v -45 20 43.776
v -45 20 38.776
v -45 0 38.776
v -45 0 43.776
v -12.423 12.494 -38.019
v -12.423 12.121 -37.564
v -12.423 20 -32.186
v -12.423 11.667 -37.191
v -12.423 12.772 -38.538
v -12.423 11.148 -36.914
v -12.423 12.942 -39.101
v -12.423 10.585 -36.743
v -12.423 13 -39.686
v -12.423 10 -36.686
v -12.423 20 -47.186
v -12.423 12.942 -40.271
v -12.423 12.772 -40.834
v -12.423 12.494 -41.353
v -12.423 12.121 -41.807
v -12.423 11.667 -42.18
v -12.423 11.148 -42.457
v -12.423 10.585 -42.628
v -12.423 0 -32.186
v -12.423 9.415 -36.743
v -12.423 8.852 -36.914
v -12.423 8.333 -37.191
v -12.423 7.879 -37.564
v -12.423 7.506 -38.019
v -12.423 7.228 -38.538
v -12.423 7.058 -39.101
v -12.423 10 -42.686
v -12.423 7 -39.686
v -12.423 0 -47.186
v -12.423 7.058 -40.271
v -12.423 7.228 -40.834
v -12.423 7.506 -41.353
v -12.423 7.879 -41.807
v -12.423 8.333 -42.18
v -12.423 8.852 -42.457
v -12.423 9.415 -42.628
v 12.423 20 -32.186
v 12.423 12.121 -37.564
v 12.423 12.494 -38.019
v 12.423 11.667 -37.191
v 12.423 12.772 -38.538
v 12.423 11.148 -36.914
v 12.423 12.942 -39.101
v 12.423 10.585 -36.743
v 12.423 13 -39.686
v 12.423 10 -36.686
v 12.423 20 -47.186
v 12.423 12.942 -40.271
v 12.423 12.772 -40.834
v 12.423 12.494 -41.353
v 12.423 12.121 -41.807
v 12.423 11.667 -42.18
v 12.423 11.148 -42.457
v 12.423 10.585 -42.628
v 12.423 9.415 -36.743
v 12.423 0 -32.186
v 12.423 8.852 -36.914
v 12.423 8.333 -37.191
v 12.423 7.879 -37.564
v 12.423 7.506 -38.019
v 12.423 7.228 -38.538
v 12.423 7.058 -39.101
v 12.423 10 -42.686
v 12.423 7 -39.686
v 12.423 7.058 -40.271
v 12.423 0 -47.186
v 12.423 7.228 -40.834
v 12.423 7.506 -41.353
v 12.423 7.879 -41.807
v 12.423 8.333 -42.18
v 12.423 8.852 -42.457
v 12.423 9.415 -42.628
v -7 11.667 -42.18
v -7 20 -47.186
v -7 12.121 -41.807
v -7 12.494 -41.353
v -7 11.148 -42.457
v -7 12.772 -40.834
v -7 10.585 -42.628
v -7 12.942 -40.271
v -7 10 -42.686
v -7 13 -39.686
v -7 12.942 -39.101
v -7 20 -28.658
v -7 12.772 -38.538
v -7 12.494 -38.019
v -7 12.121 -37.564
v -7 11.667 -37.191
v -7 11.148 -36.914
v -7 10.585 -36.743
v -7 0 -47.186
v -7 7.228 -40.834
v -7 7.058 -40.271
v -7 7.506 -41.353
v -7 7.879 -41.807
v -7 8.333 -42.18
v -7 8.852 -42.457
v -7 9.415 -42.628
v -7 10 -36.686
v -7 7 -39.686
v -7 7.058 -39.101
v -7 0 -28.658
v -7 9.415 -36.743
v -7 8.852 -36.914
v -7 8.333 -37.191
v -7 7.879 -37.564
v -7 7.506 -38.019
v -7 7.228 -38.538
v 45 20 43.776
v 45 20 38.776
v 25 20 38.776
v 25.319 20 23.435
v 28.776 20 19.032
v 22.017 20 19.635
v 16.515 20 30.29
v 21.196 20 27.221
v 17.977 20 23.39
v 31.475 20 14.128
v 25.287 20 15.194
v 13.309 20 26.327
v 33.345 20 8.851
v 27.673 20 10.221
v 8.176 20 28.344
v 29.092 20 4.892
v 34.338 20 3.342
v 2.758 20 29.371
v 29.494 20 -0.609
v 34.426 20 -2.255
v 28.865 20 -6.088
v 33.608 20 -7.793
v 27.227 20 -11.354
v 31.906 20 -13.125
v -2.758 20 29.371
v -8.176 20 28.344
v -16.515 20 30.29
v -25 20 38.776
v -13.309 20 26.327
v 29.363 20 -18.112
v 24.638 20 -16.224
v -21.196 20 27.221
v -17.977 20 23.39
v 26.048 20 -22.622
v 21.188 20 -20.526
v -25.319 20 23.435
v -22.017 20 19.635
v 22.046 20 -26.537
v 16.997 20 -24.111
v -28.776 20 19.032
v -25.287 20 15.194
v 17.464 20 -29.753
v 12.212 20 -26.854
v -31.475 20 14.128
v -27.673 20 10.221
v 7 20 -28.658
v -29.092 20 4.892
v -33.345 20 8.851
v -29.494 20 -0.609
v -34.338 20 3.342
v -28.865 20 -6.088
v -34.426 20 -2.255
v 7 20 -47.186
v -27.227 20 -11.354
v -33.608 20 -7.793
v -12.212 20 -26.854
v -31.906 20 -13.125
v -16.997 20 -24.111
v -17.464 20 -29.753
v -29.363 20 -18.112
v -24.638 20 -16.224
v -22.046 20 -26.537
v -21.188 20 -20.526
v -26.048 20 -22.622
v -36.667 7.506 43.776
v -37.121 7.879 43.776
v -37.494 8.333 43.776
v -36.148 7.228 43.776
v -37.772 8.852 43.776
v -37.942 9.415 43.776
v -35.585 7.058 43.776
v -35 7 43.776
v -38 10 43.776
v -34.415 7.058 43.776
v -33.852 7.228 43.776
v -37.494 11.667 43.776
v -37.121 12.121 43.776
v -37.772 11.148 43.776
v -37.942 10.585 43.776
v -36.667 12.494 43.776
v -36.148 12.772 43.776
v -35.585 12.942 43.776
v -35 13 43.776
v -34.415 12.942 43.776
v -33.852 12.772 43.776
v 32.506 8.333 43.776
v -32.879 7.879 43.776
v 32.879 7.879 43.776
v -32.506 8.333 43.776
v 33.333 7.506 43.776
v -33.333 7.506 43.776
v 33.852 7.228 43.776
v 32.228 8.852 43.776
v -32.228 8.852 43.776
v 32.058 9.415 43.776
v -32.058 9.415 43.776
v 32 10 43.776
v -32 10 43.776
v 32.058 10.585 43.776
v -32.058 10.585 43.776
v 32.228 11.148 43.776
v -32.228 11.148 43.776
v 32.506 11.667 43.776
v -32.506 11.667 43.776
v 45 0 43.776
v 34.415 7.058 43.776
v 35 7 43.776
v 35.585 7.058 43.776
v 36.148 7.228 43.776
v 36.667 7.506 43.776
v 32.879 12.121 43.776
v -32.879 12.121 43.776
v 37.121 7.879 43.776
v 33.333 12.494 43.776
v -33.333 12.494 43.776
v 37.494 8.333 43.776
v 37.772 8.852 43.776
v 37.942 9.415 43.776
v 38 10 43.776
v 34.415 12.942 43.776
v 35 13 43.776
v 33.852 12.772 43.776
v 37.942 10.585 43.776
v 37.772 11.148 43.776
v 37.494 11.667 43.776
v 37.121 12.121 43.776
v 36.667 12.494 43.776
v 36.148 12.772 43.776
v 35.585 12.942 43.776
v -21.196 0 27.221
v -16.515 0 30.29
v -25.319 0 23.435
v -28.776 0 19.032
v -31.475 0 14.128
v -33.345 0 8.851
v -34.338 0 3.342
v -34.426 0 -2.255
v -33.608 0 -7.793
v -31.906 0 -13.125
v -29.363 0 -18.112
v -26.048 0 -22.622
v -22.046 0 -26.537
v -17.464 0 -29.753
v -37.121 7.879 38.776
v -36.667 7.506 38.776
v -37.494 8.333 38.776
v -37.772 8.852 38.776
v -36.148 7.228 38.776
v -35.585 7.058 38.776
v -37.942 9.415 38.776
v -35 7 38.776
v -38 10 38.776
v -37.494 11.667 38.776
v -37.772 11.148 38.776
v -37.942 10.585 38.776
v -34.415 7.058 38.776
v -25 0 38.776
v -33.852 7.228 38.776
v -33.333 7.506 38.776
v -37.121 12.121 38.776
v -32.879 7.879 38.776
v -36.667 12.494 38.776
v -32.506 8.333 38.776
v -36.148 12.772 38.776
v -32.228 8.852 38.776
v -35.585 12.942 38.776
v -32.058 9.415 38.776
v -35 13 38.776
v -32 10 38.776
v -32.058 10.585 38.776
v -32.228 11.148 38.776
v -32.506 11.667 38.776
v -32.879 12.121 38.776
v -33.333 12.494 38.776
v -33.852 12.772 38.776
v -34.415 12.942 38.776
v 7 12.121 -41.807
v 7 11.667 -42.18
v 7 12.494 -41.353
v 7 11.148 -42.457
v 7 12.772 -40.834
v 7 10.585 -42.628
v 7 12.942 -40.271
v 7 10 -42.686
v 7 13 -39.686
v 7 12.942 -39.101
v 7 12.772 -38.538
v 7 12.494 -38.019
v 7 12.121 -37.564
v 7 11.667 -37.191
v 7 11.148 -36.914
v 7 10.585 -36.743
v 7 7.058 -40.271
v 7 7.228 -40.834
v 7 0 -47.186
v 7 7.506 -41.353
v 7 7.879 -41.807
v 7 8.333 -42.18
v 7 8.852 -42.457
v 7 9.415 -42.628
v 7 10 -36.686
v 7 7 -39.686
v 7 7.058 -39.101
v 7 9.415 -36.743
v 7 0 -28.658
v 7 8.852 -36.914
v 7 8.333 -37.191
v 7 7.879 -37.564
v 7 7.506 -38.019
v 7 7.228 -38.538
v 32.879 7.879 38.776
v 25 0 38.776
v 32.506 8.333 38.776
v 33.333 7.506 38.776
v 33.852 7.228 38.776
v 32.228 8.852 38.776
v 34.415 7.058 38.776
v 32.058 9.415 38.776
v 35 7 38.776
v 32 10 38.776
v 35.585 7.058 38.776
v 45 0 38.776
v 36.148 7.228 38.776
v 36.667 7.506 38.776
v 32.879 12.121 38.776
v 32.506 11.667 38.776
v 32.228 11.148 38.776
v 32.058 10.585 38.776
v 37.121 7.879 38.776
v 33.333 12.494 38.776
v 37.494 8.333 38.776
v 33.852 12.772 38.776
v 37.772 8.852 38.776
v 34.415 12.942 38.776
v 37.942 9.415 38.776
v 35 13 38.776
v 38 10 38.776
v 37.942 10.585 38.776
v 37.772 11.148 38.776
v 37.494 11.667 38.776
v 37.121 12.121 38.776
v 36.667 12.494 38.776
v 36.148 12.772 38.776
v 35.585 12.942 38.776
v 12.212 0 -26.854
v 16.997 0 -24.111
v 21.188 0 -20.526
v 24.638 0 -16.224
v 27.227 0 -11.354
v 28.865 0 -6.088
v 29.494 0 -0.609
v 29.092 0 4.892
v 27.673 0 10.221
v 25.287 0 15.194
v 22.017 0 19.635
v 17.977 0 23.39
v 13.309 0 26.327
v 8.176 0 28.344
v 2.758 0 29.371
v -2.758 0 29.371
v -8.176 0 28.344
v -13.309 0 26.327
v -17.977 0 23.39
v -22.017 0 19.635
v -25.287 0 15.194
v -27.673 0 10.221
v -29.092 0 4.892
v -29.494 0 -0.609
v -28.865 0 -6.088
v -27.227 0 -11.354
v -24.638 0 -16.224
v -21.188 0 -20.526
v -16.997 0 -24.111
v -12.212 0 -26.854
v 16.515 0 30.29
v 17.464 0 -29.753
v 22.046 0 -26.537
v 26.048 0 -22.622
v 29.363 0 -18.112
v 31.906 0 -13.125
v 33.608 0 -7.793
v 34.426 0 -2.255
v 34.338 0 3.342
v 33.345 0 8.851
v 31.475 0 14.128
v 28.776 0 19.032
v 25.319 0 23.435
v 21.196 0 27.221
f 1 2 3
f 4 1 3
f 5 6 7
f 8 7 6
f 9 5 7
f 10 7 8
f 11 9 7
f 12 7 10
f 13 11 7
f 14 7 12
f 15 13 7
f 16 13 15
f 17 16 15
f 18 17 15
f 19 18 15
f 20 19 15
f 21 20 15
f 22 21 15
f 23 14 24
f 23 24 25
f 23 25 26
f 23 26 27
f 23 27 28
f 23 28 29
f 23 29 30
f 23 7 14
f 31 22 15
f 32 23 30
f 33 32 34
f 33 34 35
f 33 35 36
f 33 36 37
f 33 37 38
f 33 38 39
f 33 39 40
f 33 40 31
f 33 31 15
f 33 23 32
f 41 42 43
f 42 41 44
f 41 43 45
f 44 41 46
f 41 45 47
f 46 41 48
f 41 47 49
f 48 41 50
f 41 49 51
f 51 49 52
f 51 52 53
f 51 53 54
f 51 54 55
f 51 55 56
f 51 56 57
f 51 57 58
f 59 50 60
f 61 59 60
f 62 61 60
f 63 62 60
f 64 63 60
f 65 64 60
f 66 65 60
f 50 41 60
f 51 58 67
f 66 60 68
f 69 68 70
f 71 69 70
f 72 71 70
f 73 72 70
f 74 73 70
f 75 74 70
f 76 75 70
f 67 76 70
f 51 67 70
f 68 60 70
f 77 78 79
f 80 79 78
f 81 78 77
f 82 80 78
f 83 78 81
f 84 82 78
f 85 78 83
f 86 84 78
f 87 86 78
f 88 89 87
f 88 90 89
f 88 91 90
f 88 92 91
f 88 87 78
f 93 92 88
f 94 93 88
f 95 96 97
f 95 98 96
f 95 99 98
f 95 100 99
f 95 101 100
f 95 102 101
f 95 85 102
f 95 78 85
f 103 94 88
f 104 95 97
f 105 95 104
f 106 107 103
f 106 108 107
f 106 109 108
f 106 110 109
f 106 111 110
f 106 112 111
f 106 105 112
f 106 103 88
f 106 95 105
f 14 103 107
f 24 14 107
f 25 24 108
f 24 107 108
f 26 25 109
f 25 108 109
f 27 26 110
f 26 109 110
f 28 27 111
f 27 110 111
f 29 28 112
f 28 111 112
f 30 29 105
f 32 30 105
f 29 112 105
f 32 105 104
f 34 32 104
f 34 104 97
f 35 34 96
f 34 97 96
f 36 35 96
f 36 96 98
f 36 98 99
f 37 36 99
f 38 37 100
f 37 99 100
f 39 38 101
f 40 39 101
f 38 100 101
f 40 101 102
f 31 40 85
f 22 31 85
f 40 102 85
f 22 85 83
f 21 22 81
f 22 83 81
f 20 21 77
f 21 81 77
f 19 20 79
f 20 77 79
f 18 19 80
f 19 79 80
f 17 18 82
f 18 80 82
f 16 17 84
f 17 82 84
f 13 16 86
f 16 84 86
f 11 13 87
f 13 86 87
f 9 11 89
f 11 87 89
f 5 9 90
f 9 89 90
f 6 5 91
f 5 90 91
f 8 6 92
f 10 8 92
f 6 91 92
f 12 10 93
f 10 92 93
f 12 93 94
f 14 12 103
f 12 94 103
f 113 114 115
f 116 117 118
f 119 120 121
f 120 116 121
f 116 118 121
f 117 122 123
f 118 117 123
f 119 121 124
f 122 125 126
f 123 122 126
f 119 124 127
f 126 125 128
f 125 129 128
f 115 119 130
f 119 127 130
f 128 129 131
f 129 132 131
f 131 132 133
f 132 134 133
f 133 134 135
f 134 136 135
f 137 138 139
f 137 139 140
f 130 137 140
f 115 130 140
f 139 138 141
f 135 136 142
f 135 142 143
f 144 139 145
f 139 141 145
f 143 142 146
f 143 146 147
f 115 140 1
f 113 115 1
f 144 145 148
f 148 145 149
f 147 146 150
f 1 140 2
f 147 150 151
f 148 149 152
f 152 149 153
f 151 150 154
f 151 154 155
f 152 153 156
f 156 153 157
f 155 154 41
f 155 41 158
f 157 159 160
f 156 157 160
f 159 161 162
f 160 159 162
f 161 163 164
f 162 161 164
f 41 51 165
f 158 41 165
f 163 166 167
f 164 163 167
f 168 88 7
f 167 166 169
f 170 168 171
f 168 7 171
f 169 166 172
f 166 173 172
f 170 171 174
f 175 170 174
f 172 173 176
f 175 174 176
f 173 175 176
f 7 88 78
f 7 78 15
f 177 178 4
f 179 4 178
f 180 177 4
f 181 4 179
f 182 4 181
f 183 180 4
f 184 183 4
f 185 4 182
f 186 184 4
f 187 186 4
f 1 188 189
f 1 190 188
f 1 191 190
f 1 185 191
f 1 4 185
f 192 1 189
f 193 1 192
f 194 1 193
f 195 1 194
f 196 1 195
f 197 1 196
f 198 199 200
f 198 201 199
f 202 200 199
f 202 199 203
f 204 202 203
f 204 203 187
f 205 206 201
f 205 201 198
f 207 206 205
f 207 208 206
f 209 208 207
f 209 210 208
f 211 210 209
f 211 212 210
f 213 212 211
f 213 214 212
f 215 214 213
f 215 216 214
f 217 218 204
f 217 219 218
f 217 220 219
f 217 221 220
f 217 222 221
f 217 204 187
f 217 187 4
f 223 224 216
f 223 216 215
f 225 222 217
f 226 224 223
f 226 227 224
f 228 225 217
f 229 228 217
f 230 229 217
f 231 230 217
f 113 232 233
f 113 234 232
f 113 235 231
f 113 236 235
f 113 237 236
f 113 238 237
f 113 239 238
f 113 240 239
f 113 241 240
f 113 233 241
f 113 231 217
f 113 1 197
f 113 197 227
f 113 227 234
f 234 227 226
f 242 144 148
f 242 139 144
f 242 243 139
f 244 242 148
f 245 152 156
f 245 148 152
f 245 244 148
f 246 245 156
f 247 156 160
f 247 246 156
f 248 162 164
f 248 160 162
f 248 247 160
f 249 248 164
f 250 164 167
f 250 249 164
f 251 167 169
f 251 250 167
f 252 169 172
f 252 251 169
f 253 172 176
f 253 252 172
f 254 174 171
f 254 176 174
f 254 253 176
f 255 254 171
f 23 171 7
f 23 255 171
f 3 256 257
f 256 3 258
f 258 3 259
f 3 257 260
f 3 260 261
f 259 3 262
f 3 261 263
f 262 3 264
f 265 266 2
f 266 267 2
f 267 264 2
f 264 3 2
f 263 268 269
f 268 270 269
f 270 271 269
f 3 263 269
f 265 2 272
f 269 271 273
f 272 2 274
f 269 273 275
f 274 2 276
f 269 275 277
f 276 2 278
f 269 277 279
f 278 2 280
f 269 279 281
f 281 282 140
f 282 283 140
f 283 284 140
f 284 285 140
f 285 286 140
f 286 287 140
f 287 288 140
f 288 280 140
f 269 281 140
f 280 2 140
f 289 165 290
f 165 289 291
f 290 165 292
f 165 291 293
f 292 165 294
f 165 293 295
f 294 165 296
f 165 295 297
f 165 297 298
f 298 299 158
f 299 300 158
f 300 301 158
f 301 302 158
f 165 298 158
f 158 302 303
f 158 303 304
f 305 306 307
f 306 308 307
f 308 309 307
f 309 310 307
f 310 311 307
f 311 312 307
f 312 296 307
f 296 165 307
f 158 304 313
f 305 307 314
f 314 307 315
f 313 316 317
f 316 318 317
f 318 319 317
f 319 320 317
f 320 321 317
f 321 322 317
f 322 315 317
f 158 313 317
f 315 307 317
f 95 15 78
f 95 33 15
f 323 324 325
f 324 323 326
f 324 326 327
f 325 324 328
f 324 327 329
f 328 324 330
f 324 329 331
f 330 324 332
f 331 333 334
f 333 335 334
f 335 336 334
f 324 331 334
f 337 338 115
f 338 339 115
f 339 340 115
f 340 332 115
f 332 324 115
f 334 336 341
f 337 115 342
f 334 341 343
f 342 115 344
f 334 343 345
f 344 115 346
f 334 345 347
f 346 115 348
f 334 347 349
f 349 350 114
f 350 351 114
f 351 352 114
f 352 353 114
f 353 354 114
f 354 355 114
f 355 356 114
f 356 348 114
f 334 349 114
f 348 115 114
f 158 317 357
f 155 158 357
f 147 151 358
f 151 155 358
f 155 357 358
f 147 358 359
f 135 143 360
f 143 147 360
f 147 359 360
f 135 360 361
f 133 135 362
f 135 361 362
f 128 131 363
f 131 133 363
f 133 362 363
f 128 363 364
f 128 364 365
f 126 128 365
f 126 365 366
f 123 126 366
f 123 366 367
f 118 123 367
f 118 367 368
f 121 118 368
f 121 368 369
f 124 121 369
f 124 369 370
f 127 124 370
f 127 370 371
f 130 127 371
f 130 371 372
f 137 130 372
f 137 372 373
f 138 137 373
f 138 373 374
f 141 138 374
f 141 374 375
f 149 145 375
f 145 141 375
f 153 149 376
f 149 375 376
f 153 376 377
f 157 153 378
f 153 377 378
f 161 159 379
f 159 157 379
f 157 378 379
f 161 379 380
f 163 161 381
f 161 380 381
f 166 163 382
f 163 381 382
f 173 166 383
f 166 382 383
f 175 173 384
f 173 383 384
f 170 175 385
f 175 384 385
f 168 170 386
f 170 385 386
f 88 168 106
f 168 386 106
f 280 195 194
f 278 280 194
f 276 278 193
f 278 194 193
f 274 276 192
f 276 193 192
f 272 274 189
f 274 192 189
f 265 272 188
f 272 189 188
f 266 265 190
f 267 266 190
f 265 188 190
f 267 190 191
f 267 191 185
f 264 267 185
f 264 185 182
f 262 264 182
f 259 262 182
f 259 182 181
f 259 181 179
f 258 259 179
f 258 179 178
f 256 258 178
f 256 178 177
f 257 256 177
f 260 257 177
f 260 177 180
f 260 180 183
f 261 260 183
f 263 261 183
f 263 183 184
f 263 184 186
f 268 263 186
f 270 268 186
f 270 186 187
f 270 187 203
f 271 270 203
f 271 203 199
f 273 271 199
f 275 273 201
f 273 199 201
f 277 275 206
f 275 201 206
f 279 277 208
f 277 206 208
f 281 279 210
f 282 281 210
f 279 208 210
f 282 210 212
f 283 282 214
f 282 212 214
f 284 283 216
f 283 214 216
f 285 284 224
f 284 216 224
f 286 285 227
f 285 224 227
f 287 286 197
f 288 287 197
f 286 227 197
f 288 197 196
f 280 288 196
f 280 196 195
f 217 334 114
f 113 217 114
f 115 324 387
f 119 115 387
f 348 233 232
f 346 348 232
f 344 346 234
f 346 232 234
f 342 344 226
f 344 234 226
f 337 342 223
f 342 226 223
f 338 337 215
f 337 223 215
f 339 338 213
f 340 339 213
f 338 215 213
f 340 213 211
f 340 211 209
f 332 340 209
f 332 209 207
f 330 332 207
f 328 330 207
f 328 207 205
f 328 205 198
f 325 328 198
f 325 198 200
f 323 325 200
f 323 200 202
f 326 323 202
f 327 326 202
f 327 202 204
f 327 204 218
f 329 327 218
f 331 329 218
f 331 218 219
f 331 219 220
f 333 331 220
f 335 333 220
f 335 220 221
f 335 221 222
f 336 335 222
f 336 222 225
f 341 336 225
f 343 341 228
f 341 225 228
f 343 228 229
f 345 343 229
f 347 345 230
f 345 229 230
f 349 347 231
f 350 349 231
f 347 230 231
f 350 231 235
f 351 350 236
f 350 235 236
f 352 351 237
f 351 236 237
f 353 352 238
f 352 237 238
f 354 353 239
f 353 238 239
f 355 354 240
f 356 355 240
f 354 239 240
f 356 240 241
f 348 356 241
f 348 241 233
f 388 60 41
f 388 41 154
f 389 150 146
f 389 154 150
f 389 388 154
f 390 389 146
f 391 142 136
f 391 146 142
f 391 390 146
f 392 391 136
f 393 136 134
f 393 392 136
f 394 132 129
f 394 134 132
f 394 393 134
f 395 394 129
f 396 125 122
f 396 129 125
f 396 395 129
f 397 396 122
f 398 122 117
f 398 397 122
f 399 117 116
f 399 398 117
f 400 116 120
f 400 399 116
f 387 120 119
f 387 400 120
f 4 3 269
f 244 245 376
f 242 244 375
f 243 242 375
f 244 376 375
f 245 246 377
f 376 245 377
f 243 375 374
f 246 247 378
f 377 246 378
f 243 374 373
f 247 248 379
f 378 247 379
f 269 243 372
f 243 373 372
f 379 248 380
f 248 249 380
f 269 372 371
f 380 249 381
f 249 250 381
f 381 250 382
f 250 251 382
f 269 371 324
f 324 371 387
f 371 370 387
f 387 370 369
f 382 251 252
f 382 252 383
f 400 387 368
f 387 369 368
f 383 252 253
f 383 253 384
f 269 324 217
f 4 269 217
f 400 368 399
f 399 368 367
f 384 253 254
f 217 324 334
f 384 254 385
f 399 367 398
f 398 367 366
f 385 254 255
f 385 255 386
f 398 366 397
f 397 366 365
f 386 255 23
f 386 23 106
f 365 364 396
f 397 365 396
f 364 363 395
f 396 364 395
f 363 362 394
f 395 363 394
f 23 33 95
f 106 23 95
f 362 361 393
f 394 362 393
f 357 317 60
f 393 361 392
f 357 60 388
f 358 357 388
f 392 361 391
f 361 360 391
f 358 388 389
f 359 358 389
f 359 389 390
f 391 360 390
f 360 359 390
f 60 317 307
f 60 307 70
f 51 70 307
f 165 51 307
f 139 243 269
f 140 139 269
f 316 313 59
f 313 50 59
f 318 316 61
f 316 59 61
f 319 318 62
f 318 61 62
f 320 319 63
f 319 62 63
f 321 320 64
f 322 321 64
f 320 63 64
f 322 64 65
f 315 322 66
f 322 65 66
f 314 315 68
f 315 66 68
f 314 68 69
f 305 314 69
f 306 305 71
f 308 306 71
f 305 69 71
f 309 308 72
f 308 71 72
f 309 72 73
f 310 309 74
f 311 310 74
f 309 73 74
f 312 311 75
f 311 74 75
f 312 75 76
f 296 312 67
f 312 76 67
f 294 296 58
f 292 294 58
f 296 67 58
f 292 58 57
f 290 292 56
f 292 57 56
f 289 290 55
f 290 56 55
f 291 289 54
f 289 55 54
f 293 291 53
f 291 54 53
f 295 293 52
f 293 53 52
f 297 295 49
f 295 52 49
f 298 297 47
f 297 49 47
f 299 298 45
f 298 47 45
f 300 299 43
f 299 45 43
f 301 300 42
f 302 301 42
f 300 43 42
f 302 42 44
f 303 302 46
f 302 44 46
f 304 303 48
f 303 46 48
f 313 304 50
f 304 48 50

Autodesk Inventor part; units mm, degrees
ref_plane "YZ Plane" through (0, 0, 0) normal (1, 0, 0) x (0, 1, 0)
ref_plane "XZ Plane" through (0, 0, 0) normal (0, 1, 0) x (-1, 0, 0)
ref_plane "XY Plane" through (0, 0, 0) normal (0, 0, 1) x (1, 0, 0)
sketch "Sketch1" plane through (0, 0, 0) normal (0, 1, 0) x (-1, 0, 0)
  arc A0 (7, -28.6575) -> (-7, -28.6575) centre (0, 0) ccw
  arc A1 (12.4228, -32.1858) -> (-12.4228, -32.1858) centre (0, 0) ccw
  line L0 (16.5147, 30.2905) -> (25, 38.7758)
  line L1 (16.5147, 30.2905) -> (28.5147, 30.2905) construction
  line L2 (25, 38.7758) -> (-25, 38.7758)
  line L3 (-25, 38.7758) -> (-16.5147, 30.2905)
  line L4 (12.4228, -32.1858) -> (12.4228, -47.1858)
  line L5 (12.4228, -47.1858) -> (7, -47.1858)
  line L6 (7, -47.1858) -> (7, -28.6575)
  line L7 (0, 0) -> (0, -37.5587) construction
  line L8 (-12.4228, -32.1858) -> (-12.4228, -47.1858)
  line L9 (-12.4228, -47.1858) -> (-7, -47.1858)
  line L10 (-7, -47.1858) -> (-7, -28.6575)
  dimension "d0" = 59
  dimension "d5" = 12
  dimension "d6" = 45
  dimension "d7" = 5
  dimension "d15" = 15
  dimension "d46" = 50
  dimension "d47" = 45
  dimension "d48" = 5.4228
  dimension "d49" = 14
  dimension "d50" = 12
extrude "Extrusion3" add sketch "Sketch1" along normal blind 20
sketch "Sketch3" plane through (-25, 0, 38.7758) normal (0, 0, 1) x (1, 0, 0)
  line L0 (0, 0) -> (50, 0) projected
  line L1 (0, 20) -> (50, 20) projected
  line L2 (-20, 0) -> (70, 0)
  line L3 (70, 0) -> (70, 20)
  line L4 (70, 20) -> (-20, 20)
  line L5 (-20, 20) -> (-20, 0)
  point P0 (25, 0)
  point P1 (25, 20)
  dimension "d18" = 90
  dimension "d19" = 20
extrude "Extrusion4" add sketch "Sketch3" along normal blind 5
hole "Hole3" at (-12.4228, 10, -39.6858) direction (1, 0, 0) diameter 6 end through all
hole "Hole4" at (-35, 10, 38.7758) direction (0, 0, 1) diameter 6 end through all
hole "Hole5" at (35, 10, 38.7758) direction (0, 0, 1) diameter 6 end through all
properties part number "pumpholder"
